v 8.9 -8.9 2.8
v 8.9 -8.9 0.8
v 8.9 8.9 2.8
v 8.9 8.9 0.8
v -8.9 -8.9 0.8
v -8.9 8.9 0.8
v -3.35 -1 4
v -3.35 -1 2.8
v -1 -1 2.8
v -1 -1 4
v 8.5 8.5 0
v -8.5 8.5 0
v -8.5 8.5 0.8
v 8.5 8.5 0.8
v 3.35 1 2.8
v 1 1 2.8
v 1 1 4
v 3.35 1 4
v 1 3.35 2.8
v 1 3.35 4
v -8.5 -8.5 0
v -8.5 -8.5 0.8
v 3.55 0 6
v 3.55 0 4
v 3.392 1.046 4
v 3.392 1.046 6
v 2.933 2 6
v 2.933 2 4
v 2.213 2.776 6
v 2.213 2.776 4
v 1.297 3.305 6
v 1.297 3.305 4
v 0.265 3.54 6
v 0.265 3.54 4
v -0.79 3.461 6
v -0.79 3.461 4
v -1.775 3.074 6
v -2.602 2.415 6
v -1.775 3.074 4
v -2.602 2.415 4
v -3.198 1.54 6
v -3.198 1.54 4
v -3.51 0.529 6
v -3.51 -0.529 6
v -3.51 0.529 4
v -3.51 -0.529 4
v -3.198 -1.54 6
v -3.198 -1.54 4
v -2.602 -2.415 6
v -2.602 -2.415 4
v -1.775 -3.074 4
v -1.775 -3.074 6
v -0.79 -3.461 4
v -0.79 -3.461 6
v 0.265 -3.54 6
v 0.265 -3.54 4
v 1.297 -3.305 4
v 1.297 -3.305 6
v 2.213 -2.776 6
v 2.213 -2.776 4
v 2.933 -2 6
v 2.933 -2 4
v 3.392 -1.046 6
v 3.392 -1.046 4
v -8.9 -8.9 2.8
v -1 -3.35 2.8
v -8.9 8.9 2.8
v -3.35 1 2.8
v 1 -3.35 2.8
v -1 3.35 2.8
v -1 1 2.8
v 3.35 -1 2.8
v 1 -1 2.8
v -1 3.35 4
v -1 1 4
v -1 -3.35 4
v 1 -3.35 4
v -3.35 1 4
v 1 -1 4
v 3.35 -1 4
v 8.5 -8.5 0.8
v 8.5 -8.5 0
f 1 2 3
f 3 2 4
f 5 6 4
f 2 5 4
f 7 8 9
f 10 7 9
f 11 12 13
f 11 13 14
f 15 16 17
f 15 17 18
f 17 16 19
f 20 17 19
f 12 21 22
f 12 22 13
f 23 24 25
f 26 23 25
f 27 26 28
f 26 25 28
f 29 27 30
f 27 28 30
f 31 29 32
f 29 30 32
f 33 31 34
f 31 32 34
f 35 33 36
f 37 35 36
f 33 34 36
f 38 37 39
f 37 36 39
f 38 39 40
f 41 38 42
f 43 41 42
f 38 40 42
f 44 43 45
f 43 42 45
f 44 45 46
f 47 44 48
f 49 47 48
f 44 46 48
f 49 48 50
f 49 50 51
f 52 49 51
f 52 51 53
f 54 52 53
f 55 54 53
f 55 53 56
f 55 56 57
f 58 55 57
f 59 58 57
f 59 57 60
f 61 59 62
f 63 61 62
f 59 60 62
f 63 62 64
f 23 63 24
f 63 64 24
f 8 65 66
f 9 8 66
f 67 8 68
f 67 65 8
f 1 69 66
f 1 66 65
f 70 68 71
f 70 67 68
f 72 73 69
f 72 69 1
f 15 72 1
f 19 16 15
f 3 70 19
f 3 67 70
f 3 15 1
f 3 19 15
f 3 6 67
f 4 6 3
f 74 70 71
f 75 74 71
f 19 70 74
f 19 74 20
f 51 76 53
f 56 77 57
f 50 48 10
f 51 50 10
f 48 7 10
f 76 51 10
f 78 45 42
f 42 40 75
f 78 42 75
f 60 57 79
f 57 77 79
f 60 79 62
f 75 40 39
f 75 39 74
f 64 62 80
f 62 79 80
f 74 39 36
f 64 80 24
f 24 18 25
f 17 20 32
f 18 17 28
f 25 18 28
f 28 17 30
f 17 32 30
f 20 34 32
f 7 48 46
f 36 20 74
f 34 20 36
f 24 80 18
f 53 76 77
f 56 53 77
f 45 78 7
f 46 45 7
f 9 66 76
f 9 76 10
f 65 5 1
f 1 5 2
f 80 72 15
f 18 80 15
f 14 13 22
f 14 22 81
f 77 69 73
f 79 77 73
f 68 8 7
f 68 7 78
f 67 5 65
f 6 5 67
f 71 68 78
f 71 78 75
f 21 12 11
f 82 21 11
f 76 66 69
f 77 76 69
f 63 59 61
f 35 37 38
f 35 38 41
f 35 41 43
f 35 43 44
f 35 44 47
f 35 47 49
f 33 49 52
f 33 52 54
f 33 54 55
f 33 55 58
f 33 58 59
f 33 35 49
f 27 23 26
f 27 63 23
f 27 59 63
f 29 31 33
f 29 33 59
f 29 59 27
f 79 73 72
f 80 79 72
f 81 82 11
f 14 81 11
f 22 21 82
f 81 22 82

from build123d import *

# Parameters (mm, degrees)
F1_W     = 17
F1_H     = 17
F2_DEPTH = 0.8
F3_W     = 17.8
F3_H     = 17.8
F3_W_2   = 17
F3_H_2   = 17
F4_DEPTH = 2
F5_W     = 2
F5_H     = 2.35
F5_H_2   = 2
F5_W_2   = 2.35
F6_DEPTH = 1.2
F7_R     = 3.55
F8_DEPTH = 2


with BuildPart() as f2:
    # F1 (on Top) → F2 (new body)
    with BuildSketch(Plane.XY):
        Rectangle(F1_W, F1_H)
    extrude(amount=F2_DEPTH)


with BuildPart() as f4:
    # F3 (on face) → F4 (new body)
    with BuildSketch(Plane.XY.offset(0.8)):
        Rectangle(F3_W, F3_H)
        Rectangle(F3_W_2, F3_H_2, mode=Mode.SUBTRACT)
        Rectangle(F3_W_2, F3_H_2)
    extrude(amount=F4_DEPTH)

    # F5 (on face) → F6 (join)
    with BuildSketch(Plane.XY.offset(2.8)):
        with Locations((0, 2.175)):
            Rectangle(F5_W, F5_H)
        Rectangle(F5_W, F5_H_2)
        with Locations((2.175, 0)):
            Rectangle(F5_W_2, F5_H_2)
        with Locations((-2.175, 0)):
            Rectangle(F5_W_2, F5_H_2)
        with Locations((0, -2.175)):
            Rectangle(F5_W, F5_H)
    extrude(amount=F6_DEPTH)

    # F7 (on face) → F8 (join)
    with BuildSketch(Plane.XY.offset(4)):
        Circle(F7_R)
        Polygon((-1, 3.35), (1, 3.35), (1, 1), (3.35, 1), (3.35, -1), (1, -1), (1, -3.35), (-1, -3.35), (-1, -1), (-3.35, -1), (-3.35, 1), (-1, 1), align=None, mode=Mode.SUBTRACT)
        Polygon((1, 1), (1, 3.35), (-1, 3.35), (-1, 1), (-3.35, 1), (-3.35, -1), (-1, -1), (-1, -3.35), (1, -3.35), (1, -1), (3.35, -1), (3.35, 1), align=None)
    extrude(amount=F8_DEPTH)


solid = Compound([f2.part, f4.part])
